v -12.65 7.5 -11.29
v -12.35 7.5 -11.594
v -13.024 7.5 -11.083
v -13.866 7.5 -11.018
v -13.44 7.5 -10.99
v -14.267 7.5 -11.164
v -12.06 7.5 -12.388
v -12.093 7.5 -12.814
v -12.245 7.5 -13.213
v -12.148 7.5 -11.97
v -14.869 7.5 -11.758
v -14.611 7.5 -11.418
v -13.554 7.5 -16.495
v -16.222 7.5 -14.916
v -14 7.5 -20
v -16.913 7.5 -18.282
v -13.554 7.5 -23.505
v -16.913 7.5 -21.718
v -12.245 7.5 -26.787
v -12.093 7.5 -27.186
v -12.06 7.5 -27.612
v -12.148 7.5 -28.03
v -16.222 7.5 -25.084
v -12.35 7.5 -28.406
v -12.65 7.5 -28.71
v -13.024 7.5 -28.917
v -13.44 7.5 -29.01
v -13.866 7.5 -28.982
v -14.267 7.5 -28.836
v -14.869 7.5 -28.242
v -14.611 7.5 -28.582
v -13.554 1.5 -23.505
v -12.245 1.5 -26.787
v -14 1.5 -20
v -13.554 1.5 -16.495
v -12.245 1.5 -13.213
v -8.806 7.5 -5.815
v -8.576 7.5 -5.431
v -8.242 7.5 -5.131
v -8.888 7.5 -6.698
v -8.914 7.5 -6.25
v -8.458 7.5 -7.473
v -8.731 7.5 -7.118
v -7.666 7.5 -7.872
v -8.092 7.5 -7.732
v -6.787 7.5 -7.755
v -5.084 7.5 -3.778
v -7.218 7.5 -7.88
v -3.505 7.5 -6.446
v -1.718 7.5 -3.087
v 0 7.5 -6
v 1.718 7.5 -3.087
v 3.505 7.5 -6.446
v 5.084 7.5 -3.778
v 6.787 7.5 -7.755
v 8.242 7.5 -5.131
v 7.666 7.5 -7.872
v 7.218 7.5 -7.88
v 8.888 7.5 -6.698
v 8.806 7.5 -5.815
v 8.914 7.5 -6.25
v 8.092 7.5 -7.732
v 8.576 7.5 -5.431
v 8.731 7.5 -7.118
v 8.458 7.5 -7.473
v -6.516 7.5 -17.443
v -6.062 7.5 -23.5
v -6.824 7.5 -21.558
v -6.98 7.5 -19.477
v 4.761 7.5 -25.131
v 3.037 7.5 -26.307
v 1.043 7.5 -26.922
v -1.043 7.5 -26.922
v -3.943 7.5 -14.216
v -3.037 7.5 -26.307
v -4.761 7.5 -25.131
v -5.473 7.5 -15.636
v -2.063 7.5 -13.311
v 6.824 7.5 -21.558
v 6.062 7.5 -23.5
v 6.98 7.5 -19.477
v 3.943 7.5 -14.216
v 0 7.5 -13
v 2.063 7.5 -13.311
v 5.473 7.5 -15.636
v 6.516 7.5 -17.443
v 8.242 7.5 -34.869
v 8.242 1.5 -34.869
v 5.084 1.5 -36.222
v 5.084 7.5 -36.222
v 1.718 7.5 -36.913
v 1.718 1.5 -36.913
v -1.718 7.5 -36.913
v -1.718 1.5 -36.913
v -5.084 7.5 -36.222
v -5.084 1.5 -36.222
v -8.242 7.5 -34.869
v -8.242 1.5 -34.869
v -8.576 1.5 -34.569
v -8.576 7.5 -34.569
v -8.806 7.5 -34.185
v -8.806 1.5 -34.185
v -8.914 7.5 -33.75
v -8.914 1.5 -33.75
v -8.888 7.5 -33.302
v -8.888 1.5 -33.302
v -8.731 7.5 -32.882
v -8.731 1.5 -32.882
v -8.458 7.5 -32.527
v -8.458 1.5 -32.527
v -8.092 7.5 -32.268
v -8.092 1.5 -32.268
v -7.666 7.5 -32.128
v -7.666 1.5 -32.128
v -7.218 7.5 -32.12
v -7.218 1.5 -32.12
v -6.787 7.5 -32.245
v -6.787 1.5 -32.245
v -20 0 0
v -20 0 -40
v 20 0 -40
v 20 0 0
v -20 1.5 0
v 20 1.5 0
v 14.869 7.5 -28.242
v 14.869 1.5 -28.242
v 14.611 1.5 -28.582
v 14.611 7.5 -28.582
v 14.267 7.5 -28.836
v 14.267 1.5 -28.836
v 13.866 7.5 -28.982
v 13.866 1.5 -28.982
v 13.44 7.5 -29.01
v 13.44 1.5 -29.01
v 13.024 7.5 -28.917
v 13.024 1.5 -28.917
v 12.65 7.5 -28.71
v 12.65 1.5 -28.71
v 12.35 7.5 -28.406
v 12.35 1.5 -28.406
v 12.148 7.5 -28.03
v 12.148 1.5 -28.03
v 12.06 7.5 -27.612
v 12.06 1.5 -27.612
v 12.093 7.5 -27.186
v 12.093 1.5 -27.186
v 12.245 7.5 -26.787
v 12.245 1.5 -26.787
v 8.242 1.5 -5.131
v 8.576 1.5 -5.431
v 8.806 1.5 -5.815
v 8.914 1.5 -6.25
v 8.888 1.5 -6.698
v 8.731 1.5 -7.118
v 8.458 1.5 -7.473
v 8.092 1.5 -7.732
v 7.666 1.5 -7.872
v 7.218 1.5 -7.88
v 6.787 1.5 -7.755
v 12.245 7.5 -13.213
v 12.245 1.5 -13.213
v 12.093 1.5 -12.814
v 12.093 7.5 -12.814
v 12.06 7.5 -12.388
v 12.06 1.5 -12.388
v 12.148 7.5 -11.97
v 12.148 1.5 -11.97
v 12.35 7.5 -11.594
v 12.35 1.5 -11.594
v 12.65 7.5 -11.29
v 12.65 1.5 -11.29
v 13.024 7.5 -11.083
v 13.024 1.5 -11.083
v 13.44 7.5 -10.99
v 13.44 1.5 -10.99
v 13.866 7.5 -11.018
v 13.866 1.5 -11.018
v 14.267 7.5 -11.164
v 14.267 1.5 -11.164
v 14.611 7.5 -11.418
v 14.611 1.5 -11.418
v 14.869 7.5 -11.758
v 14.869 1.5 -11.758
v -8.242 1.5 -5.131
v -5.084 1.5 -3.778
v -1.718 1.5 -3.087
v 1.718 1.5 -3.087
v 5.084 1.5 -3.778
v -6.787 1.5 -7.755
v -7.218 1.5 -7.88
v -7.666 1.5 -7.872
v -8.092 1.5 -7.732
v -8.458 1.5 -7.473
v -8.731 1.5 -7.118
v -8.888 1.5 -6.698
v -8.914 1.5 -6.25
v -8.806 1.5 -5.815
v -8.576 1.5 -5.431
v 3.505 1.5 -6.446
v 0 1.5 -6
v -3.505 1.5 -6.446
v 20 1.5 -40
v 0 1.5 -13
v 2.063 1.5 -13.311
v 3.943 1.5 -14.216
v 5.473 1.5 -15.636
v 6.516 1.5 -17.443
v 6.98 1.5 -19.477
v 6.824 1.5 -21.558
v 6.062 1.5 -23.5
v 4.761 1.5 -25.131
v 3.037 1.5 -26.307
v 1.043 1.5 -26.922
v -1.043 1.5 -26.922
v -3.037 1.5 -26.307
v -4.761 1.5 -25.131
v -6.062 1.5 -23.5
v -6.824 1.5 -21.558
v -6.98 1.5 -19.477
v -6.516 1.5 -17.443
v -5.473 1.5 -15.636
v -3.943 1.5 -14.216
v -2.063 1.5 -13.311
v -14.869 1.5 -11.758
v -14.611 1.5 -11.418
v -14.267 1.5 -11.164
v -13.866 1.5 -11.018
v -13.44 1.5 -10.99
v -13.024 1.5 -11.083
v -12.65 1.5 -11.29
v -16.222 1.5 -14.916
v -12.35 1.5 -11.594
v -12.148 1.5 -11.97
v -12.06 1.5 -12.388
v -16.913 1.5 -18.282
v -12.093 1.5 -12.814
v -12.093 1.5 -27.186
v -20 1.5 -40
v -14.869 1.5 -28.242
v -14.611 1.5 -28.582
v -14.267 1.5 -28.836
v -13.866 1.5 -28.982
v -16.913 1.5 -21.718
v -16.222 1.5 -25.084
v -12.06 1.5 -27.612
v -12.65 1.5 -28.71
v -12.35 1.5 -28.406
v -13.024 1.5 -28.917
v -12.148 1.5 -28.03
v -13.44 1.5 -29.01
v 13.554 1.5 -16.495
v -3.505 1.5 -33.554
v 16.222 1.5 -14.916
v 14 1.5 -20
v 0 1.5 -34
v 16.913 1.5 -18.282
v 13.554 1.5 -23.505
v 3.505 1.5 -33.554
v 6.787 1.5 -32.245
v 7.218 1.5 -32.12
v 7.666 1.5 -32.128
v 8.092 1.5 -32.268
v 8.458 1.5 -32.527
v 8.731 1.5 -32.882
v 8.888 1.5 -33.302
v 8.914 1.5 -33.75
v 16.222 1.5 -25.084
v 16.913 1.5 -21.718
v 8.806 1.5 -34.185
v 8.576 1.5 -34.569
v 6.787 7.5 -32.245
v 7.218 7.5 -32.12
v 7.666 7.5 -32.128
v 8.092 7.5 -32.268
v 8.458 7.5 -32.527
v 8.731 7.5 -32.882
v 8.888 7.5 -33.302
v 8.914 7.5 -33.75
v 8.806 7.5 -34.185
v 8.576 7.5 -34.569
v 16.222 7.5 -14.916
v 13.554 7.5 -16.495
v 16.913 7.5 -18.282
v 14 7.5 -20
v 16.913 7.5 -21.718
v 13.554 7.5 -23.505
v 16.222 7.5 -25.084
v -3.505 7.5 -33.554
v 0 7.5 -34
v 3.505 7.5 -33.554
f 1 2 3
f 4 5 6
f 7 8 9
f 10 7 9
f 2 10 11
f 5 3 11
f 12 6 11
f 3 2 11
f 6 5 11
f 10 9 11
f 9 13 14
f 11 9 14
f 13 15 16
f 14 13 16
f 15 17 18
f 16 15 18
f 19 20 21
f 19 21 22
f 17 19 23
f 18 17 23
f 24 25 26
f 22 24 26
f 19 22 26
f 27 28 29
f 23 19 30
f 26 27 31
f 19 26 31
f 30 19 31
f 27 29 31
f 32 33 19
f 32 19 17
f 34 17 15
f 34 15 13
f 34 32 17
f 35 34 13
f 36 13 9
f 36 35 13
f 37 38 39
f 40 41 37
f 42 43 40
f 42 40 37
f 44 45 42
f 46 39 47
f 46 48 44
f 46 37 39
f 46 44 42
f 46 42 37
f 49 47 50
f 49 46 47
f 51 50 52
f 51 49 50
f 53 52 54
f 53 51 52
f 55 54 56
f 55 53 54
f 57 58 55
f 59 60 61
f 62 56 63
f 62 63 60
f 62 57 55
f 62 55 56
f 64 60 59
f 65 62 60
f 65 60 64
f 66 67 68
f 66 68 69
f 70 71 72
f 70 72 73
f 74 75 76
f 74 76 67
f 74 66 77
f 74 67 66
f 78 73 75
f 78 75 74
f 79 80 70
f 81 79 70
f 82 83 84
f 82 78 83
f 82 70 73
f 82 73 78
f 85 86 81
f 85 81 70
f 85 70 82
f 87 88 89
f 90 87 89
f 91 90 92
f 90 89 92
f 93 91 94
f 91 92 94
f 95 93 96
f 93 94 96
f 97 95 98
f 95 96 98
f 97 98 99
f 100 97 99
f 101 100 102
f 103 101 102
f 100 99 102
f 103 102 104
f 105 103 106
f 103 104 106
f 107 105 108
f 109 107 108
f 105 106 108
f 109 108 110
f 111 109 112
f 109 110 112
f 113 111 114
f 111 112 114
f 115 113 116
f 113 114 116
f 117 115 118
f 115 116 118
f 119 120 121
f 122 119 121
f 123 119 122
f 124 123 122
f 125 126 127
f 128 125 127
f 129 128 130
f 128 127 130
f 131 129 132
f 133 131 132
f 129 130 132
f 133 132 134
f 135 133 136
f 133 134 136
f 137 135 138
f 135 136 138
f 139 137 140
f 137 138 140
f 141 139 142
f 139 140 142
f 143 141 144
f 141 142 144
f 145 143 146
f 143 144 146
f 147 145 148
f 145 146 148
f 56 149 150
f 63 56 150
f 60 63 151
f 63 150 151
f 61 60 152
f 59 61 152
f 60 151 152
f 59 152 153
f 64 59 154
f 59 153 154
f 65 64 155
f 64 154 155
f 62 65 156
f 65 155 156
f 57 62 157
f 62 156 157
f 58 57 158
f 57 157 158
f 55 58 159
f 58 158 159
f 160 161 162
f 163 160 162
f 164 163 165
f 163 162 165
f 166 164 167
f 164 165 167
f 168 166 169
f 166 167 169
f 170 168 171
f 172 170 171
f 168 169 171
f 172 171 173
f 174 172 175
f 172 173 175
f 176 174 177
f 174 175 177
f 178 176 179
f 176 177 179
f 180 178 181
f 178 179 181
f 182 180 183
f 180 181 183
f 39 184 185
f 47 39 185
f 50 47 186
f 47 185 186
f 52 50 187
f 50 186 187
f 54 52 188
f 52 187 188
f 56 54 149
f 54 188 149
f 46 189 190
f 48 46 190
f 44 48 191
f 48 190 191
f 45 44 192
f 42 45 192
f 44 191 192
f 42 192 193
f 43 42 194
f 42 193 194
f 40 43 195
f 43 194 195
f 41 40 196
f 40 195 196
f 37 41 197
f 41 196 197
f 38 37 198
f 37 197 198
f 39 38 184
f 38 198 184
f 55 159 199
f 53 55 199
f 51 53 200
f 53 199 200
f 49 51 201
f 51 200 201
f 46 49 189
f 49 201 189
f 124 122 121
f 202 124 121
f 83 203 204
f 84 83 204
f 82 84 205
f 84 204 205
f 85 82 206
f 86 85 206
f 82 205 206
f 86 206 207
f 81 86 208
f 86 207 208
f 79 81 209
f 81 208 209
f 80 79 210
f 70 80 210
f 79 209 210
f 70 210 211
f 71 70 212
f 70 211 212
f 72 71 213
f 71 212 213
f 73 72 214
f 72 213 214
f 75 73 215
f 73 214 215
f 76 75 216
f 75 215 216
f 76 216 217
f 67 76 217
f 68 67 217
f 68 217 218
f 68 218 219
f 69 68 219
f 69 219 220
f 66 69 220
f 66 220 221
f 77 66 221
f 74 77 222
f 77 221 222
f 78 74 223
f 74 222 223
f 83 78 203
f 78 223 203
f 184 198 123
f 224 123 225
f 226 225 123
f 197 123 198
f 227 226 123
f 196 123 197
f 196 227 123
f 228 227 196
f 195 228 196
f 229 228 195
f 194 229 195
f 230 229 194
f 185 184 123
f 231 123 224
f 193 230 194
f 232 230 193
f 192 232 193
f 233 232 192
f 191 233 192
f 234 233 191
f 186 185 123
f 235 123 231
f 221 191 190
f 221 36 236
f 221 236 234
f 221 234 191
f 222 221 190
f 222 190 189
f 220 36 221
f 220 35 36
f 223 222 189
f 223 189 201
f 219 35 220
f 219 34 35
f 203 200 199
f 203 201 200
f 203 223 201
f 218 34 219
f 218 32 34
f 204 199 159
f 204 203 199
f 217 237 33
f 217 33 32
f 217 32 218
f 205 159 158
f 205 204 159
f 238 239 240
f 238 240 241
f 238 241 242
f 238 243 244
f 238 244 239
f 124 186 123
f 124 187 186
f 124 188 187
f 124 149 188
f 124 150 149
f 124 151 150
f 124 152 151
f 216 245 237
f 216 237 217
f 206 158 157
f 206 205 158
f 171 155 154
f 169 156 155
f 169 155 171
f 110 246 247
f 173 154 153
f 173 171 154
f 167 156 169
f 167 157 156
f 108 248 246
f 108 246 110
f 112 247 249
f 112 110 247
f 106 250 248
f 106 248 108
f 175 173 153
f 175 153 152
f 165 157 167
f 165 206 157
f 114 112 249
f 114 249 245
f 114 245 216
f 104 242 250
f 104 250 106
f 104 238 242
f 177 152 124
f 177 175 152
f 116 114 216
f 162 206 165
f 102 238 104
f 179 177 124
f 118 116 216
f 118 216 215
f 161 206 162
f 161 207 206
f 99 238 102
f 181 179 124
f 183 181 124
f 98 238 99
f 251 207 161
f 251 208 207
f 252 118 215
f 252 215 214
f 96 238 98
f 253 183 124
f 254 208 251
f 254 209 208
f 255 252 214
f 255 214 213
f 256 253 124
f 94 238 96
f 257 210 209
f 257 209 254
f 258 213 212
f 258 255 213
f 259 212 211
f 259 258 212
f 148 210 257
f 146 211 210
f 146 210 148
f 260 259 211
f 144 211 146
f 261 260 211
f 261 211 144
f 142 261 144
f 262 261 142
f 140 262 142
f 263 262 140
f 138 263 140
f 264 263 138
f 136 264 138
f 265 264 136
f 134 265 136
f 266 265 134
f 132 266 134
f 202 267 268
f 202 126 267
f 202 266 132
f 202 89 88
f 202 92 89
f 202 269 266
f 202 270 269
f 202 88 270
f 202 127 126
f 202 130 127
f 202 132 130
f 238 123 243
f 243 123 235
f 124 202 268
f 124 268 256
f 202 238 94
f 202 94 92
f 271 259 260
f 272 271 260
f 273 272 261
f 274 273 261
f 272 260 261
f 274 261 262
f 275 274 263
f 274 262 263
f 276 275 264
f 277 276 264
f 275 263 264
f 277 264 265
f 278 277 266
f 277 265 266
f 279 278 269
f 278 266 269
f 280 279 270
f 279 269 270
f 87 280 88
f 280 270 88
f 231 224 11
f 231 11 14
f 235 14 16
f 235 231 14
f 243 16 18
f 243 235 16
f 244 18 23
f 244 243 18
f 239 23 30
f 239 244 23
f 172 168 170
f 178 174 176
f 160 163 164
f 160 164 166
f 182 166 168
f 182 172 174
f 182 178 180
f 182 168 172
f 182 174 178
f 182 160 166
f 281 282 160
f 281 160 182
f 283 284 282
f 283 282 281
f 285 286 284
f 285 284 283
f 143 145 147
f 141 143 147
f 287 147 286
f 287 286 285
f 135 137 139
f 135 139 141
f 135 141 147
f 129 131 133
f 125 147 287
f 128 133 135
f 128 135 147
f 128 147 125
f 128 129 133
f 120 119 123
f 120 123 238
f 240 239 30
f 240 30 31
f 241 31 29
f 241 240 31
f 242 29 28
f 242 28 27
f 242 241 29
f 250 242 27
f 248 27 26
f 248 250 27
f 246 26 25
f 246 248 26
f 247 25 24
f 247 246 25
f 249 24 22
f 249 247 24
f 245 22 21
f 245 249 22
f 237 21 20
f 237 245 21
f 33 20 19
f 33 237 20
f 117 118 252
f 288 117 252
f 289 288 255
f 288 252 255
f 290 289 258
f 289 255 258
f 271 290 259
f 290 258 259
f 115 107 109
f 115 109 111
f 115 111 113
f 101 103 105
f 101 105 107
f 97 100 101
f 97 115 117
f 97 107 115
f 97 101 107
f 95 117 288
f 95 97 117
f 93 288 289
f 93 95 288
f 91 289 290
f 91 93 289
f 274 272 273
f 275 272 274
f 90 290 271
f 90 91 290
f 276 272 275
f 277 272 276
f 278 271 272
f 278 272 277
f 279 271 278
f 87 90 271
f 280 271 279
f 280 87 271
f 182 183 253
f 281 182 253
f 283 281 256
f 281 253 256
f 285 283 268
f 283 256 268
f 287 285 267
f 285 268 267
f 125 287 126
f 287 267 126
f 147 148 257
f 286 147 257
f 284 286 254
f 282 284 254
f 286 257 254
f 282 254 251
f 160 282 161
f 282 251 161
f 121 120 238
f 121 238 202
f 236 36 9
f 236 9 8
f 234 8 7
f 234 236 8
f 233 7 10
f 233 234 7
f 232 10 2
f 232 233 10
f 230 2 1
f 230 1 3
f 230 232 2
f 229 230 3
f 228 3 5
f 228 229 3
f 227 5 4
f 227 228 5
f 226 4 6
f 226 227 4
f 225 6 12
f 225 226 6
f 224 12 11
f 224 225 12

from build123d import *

# Parameters (mm, degrees)
SKETCH1_W           = 40
SKETCH1_H           = 40
BOSS_EXTRUDE1_DEPTH = 1.5
SKETCH2_R           = 7
BOSS_EXTRUDE2_DEPTH = 6


with BuildPart() as part:
    # Sketch1 → Boss-Extrude1 (new body)
    with BuildSketch(Plane(origin=(0, 0, 0), x_dir=(1, 0, 0), z_dir=(0, 1, 0))):
        with Locations((0, 20)):
            Rectangle(SKETCH1_W, SKETCH1_H)
    extrude(amount=BOSS_EXTRUDE1_DEPTH)

    # Sketch2 → Boss-Extrude2 (add)
    with BuildSketch(Plane(origin=(0, 1.5, 0), x_dir=(1, 0, 0), z_dir=(0, 1, 0))):
        with Locations(Location((0, 20, 0), (0, 0, 270))):
            Circle(SKETCH2_R)
        with BuildLine():
            ThreePointArc((-6.787334683, 32.2446759), (0, 34), (6.787334683, 32.2446759))
            ThreePointArc((6.787334683, 32.2446759), (8.731496224, 32.882040662), (8.241763544, 34.868535021))
            ThreePointArc((8.241763544, 34.868535021), (0, 37), (-8.241763544, 34.868535021))
            ThreePointArc((-8.241763544, 34.868535021), (-8.731496224, 32.882040662), (-6.787334683, 32.2446759))
        make_face()
        with BuildLine():
            ThreePointArc((-8.241763544, 5.131464979), (0, 3), (8.241763544, 5.131464979))
            ThreePointArc((8.241763544, 5.131464979), (8.731496224, 7.117959338), (6.787334683, 7.7553241))
            ThreePointArc((6.787334683, 7.7553241), (0, 6), (-6.787334683, 7.7553241))
            ThreePointArc((-6.787334683, 7.7553241), (-8.731496224, 7.117959338), (-8.241763544, 5.131464979))
        make_face()
        with BuildLine():
            ThreePointArc((12.2446759, 26.787334683), (14, 20), (12.2446759, 13.212665317))
            ThreePointArc((12.2446759, 13.212665317), (12.82939103, 11.173521325), (14.868535021, 11.758236456))
            ThreePointArc((14.868535021, 11.758236456), (17, 20), (14.868535021, 28.241763544))
            ThreePointArc((14.868535021, 28.241763544), (12.82939103, 28.826478675), (12.2446759, 26.787334683))
        make_face()
        with BuildLine():
            ThreePointArc((-12.2446759, 26.787334683), (-14, 20), (-12.2446759, 13.212665317))
            ThreePointArc((-12.2446759, 13.212665317), (-12.82939103, 11.173521325), (-14.868535021, 11.758236456))
            ThreePointArc((-14.868535021, 11.758236456), (-17, 20), (-14.868535021, 28.241763544))
            ThreePointArc((-14.868535021, 28.241763544), (-12.82939103, 28.826478675), (-12.2446759, 26.787334683))
        make_face()
    extrude(amount=BOSS_EXTRUDE2_DEPTH)


solid = part.part
